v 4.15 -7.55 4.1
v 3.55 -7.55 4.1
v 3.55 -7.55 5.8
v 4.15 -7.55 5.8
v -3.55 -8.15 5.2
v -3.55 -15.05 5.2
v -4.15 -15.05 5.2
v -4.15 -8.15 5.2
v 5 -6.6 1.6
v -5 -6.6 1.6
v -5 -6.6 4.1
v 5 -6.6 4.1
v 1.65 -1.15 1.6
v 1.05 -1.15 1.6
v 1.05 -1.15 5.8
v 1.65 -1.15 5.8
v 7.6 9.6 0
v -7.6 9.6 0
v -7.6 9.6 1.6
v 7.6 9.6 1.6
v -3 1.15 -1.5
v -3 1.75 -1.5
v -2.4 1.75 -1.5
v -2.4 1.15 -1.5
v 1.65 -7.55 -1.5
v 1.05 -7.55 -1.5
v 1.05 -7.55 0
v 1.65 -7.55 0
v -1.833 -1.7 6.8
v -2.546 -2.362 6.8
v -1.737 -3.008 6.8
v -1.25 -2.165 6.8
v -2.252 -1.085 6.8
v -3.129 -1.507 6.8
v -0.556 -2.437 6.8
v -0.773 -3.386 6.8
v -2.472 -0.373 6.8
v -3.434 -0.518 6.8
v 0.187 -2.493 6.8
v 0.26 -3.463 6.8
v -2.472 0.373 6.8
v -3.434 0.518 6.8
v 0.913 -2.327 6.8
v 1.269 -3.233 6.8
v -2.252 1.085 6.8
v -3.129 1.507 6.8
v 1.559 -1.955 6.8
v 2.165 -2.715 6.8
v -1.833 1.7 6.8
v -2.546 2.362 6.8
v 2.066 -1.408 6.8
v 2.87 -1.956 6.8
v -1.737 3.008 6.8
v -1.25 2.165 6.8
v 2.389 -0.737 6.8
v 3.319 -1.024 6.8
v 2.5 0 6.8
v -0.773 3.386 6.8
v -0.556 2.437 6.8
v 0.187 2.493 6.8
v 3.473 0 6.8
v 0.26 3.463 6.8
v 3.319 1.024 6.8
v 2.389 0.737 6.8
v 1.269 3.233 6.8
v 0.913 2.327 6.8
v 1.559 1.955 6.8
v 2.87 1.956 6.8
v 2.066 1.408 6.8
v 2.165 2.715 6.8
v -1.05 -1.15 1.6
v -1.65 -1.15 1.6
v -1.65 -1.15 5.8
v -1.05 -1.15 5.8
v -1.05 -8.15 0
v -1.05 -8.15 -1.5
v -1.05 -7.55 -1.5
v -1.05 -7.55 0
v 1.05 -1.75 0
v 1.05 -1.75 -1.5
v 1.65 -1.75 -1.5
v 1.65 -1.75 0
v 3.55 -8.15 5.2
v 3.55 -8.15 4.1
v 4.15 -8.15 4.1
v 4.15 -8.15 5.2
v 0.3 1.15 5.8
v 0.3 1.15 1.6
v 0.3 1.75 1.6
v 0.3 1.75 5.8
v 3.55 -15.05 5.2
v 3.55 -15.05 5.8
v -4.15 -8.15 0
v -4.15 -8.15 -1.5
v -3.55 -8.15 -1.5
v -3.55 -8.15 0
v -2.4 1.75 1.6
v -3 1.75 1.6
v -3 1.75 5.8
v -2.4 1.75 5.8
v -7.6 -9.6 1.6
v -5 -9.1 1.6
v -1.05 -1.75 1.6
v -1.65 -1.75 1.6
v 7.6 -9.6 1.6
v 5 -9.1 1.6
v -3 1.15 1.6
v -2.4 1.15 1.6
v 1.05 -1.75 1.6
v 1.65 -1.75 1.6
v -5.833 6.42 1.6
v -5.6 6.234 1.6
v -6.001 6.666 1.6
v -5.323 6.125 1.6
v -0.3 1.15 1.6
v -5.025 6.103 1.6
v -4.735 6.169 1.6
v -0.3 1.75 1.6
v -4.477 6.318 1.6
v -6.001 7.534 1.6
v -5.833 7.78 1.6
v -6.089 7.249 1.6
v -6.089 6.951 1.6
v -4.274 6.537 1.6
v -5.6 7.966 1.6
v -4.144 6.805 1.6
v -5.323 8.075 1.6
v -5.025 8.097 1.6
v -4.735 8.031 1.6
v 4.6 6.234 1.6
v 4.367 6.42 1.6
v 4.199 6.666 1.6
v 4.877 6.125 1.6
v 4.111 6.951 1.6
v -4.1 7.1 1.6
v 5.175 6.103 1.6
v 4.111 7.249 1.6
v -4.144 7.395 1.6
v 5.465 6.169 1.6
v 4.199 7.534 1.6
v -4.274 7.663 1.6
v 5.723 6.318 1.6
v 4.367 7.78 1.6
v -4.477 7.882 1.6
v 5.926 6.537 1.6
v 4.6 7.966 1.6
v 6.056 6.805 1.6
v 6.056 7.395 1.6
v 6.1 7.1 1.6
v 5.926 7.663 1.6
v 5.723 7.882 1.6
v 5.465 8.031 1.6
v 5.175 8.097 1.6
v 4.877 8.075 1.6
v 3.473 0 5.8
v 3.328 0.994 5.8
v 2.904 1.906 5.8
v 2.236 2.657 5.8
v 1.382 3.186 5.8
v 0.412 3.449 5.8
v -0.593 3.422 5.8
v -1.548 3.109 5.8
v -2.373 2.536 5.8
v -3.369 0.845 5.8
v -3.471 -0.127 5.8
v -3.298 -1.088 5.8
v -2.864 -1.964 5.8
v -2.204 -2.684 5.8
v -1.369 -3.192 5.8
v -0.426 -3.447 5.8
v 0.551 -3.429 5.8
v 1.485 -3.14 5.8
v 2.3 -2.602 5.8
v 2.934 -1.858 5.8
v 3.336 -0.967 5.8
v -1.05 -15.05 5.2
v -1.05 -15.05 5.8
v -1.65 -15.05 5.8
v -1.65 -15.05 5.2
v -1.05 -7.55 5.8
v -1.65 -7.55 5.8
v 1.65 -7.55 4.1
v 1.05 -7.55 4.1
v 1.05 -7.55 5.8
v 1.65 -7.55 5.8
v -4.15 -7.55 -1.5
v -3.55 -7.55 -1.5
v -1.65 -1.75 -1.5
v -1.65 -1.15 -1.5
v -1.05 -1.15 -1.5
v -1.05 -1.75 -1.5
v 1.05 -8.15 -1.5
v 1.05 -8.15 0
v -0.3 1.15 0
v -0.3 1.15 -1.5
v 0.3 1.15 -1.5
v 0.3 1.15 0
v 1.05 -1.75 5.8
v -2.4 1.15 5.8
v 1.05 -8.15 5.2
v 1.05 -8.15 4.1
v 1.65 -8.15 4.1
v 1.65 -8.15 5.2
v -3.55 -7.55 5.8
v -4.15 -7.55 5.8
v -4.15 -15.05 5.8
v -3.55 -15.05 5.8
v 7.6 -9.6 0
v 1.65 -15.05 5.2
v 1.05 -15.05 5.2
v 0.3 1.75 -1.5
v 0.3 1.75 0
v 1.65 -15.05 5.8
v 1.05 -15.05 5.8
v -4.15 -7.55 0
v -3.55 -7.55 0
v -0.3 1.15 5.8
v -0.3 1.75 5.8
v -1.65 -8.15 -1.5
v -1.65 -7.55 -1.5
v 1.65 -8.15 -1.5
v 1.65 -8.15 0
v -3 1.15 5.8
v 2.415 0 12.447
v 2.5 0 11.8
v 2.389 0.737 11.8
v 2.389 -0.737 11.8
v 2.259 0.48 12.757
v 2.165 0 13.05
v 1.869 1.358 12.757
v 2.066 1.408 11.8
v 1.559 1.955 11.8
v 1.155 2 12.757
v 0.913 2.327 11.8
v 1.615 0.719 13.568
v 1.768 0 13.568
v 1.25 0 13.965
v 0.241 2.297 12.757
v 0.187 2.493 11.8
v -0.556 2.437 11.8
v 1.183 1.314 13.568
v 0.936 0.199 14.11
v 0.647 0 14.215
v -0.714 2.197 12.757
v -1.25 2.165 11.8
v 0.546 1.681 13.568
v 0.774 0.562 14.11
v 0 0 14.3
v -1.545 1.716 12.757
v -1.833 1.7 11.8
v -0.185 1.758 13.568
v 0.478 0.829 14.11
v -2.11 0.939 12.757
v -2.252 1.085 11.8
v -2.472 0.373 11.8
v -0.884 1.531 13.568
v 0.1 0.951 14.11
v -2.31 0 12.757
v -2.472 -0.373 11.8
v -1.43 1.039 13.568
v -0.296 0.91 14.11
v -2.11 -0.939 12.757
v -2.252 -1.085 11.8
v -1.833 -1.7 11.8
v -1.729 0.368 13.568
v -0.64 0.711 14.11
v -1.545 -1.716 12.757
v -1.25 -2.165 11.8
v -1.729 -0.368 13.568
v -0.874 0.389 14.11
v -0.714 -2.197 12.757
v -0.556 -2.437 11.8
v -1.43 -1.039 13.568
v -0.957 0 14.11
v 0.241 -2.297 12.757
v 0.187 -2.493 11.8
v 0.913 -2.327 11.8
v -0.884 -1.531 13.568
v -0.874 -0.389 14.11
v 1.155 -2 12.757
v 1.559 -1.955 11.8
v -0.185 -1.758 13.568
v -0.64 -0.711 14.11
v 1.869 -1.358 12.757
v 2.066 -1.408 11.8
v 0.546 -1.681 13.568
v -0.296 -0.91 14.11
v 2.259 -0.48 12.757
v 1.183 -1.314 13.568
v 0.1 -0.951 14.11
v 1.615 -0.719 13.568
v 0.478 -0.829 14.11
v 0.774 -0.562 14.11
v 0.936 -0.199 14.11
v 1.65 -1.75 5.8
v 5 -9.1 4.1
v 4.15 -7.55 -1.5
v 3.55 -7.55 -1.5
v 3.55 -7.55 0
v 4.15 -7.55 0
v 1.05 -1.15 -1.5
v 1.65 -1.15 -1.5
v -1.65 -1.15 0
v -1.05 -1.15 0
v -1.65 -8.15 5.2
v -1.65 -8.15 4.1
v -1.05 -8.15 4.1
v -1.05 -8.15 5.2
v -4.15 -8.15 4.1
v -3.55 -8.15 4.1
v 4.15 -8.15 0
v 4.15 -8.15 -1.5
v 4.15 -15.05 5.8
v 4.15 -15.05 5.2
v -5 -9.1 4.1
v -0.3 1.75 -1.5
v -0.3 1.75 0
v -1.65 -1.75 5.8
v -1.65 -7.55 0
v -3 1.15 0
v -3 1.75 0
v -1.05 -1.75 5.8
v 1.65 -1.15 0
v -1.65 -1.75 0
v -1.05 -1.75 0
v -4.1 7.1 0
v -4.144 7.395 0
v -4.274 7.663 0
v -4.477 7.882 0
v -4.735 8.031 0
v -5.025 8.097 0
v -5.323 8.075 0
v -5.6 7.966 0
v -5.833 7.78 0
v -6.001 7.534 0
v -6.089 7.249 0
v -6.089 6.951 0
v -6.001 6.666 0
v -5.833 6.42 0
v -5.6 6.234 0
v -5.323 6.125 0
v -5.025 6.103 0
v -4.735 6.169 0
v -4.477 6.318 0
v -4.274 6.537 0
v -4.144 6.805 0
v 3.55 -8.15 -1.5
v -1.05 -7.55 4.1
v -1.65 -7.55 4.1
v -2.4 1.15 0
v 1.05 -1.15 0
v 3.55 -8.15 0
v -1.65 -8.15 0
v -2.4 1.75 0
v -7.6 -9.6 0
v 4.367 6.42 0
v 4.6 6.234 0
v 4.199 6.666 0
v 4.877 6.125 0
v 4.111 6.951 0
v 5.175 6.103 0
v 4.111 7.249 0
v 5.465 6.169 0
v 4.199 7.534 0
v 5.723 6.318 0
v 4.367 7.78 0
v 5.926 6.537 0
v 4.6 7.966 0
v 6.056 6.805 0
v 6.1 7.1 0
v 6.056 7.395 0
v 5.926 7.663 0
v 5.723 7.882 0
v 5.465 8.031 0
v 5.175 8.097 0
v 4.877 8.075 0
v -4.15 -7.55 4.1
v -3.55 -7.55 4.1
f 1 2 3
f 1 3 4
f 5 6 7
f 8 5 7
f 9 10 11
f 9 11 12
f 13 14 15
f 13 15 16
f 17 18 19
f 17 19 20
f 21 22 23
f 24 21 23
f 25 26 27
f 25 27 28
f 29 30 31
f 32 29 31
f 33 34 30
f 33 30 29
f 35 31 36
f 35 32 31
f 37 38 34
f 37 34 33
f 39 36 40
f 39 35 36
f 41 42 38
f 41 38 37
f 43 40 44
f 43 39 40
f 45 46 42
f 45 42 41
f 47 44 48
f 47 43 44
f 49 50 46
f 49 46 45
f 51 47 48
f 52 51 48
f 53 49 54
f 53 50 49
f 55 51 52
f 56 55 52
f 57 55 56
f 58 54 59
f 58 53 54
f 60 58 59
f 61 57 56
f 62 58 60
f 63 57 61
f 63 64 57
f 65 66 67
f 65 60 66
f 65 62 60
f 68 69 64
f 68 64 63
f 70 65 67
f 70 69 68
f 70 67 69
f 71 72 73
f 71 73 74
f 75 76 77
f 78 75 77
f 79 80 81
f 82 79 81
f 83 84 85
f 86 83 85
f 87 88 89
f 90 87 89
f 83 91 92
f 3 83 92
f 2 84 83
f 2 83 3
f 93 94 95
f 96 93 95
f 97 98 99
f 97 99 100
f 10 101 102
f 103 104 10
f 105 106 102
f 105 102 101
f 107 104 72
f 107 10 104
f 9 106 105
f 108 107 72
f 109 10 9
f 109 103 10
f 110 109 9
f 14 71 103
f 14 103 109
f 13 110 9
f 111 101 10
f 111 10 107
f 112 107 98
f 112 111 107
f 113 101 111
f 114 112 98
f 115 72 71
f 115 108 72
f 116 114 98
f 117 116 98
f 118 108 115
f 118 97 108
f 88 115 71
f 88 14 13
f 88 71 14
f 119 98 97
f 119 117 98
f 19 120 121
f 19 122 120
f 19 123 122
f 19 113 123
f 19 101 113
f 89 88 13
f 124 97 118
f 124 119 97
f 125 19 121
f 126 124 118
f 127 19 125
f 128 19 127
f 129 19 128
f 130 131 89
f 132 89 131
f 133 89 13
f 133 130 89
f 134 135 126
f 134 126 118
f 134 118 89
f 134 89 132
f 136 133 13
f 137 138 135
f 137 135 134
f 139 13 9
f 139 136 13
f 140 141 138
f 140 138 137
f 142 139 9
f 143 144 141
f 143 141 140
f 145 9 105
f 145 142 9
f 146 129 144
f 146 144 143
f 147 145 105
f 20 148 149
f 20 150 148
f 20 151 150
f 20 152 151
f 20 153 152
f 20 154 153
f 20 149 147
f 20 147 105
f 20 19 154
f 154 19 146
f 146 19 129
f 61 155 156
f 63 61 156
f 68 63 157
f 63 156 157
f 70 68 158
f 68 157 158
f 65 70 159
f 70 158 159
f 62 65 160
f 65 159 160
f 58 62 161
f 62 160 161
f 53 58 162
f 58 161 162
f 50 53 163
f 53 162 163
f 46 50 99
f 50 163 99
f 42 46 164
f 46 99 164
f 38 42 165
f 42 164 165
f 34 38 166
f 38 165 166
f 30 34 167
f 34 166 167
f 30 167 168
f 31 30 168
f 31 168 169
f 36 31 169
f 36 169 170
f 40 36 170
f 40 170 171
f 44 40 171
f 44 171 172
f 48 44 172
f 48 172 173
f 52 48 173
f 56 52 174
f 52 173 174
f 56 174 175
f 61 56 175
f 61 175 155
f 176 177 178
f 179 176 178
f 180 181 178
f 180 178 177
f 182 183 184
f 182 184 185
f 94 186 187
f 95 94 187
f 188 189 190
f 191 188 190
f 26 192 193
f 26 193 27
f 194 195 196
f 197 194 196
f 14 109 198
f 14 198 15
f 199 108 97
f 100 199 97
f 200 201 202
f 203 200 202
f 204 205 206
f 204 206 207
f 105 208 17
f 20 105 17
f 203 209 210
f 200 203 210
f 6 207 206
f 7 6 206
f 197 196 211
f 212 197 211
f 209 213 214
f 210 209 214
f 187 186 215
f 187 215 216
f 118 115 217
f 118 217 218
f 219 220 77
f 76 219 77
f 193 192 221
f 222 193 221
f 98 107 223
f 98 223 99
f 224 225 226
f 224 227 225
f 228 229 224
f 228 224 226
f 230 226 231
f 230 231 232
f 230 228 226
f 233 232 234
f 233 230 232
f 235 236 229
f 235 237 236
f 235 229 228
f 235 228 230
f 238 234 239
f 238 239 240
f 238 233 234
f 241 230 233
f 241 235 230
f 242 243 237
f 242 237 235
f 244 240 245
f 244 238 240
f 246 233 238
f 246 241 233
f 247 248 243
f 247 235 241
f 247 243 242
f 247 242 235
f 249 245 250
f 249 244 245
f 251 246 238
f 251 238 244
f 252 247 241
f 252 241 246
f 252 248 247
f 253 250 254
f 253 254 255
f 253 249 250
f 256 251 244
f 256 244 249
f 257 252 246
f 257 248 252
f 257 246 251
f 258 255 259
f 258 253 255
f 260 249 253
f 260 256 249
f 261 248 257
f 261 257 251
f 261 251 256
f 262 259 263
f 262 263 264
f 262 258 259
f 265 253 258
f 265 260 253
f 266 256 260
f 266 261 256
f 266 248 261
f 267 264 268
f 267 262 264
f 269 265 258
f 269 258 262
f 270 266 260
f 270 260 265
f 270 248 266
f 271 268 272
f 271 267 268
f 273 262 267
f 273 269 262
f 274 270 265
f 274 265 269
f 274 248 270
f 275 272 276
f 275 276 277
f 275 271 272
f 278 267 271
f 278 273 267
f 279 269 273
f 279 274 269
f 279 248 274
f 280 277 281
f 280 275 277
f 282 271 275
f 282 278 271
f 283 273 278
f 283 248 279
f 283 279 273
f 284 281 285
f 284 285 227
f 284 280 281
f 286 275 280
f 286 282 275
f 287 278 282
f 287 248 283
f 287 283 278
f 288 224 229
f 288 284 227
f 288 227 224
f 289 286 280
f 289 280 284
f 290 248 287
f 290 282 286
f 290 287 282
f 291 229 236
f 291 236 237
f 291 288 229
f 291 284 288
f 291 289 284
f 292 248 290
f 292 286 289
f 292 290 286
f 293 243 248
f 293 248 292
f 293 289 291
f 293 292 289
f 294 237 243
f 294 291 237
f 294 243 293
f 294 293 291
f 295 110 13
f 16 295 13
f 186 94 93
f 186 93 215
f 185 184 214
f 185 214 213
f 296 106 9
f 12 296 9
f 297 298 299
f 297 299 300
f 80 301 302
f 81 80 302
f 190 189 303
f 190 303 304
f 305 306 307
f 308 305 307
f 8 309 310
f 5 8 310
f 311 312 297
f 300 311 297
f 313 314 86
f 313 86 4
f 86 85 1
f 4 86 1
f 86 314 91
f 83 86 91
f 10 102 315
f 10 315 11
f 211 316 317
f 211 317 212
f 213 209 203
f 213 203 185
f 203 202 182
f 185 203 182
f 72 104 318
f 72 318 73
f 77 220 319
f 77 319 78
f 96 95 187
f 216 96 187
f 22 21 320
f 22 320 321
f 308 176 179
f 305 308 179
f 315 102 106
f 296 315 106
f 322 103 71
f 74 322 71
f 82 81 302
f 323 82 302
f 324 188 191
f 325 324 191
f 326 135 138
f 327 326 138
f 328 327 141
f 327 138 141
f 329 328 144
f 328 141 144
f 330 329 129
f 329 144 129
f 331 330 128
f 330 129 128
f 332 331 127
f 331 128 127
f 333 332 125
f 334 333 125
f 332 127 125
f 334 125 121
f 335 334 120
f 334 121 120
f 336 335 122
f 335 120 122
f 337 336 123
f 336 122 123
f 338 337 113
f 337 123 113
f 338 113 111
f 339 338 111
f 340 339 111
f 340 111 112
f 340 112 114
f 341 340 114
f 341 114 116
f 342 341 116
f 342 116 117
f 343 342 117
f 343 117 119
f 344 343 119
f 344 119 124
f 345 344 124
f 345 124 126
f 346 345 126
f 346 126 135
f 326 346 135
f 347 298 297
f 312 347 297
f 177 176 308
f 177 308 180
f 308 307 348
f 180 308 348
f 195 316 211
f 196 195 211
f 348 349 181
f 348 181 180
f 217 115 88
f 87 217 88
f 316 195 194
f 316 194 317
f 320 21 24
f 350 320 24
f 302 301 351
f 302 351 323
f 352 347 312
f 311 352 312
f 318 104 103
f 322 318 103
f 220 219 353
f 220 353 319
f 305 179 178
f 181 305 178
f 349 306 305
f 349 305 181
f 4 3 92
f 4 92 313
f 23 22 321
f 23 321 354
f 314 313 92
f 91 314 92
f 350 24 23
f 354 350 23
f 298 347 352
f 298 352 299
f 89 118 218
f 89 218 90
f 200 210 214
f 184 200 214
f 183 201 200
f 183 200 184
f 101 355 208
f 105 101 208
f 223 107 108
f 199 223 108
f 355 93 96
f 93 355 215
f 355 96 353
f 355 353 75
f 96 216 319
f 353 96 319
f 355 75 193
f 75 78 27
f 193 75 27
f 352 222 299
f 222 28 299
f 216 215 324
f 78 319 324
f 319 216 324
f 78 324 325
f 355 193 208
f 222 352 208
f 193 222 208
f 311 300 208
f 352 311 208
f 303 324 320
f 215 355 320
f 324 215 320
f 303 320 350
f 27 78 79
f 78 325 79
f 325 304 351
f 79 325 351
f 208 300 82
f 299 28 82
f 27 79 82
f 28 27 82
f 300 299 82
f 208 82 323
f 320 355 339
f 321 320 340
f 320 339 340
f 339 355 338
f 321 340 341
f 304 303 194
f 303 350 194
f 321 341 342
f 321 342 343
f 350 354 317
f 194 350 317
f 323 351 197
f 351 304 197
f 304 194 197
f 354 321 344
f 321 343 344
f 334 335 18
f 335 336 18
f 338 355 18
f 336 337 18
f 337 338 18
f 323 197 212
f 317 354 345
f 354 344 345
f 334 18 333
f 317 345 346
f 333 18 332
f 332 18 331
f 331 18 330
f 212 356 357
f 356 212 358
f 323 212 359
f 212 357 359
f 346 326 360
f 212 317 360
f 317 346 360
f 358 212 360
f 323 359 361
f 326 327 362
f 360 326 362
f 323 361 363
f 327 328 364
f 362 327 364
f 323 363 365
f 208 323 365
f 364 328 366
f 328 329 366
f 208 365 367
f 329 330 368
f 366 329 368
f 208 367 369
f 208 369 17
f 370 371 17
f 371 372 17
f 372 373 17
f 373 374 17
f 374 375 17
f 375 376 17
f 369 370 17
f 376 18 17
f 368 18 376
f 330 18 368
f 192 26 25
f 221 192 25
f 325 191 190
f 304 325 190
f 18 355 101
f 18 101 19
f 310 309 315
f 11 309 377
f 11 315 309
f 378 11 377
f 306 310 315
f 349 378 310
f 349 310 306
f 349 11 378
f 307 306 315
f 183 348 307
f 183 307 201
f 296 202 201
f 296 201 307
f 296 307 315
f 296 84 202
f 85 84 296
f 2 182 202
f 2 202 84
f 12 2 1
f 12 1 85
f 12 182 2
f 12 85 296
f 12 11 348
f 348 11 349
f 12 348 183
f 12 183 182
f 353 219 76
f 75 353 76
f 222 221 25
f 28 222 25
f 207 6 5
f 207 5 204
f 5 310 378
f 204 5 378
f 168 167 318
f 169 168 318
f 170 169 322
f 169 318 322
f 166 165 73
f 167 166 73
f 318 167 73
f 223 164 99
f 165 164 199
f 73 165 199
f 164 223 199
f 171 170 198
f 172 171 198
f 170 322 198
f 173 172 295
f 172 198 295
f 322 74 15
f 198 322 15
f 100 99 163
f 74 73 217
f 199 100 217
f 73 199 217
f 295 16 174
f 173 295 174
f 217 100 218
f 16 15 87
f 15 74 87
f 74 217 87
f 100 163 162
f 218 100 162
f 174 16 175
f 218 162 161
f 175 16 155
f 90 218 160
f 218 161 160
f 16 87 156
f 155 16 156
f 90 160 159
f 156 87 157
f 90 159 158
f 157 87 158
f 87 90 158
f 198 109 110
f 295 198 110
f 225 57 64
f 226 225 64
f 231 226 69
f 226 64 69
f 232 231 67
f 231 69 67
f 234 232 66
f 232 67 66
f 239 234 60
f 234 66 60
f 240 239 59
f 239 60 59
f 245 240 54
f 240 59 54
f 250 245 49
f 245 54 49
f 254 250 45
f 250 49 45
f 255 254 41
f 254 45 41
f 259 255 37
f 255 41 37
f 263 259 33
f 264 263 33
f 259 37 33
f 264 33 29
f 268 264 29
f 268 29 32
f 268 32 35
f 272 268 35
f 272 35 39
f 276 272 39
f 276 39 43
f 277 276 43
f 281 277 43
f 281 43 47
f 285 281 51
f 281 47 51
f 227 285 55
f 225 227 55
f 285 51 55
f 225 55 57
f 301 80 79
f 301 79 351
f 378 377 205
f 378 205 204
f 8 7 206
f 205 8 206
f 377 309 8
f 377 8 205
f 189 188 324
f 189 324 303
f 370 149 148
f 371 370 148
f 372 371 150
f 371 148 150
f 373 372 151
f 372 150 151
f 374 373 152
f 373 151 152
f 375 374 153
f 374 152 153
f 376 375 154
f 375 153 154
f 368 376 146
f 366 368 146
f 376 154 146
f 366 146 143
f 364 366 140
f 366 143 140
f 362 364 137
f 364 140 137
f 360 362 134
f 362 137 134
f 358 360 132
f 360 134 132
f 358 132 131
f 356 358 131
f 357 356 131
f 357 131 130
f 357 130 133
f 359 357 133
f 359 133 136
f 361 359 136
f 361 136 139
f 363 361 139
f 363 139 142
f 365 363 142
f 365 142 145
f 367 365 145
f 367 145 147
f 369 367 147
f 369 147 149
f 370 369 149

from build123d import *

# Parameters (mm, degrees)
F0_W      = 15.2
F0_H      = 19.2
F1_DEPTH  = 1.6
F2_R      = 1
F3_DEPTH  = 25
F4_W      = 10
F4_H      = 2.5
F5_DEPTH  = 2.5
F7_W      = 0.6
F7_H      = 0.6
F8_DEPTH  = 7.3
F9_W      = 0.6
F9_H      = 0.6
F10_DEPTH = 7.5
F11_R     = 3.473111
F12_DEPTH = 1
F13_R     = 2.5
F14_DEPTH = 7.5
F15_R     = 2.5


with BuildPart() as f1:
    # F0 (on Top) → F1 (new body)
    with BuildSketch(Plane.XY):
        Rectangle(F0_W, F0_H)
    extrude(amount=F1_DEPTH)

    # F2 (on face) → F3 (cut)
    with BuildSketch(Plane.XY.offset(1.6)):
        with Locations((-5.1, 7.1)):
            Circle(F2_R)
        with Locations((5.1, 7.1)):
            Circle(F2_R)
    extrude(amount=-F3_DEPTH, mode=Mode.SUBTRACT)

    # F4 (on face) → F5 (join)
    with BuildSketch(Plane.XY.offset(1.6)):
        with Locations((0, -7.85)):
            Rectangle(F4_W, F4_H)
    extrude(amount=F5_DEPTH)

    # F7 (on offset) → F8 (join)
    with BuildSketch(Plane.XY.offset(-1.5)):
        with Locations((3.85, -7.85)):
            Rectangle(F7_W, F7_H)
        with Locations((-3.85, -7.85)):
            Rectangle(F7_W, F7_H)
        with Locations((-1.35, -7.85)):
            Rectangle(F7_W, F7_H)
        with Locations((1.35, -7.85)):
            Rectangle(F7_W, F7_H)
        with Locations((1.35, -1.45)):
            Rectangle(F7_W, F7_H)
        with Locations((-1.35, -1.45)):
            Rectangle(F7_W, F7_H)
        with Locations((0, 1.45)):
            Rectangle(F7_W, F7_H)
        with Locations((-2.7, 1.45)):
            Rectangle(F7_W, F7_H)
    extrude(amount=F8_DEPTH)

    # F9 (on face) → F10 (join)
    with BuildSketch(Plane(origin=(0, -7.55, 0), x_dir=(-1, 0, 0), z_dir=(0, 1, 0))):
        with Locations((3.85, 5.5)):
            Rectangle(F9_W, F9_H)
        with Locations((-3.85, 5.5)):
            Rectangle(F9_W, F9_H)
        with Locations((1.35, 5.5)):
            Rectangle(F9_W, F9_H)
        with Locations((-1.35, 5.5)):
            Rectangle(F9_W, F9_H)
    extrude(amount=-F10_DEPTH)

    # F11 (on face) → F12 (join)
    with BuildSketch(Plane.XY.offset(5.8)):
        Circle(F11_R)
    extrude(amount=F12_DEPTH)

    # F13 (on face) → F14 (join)
    with BuildSketch(Plane.XY.offset(6.8)):
        Circle(F13_R)
    extrude(amount=F14_DEPTH)

    # F15
    f15_edges = [f1.edges().sort_by_distance(p)[0] for p in [
        (-2.5, 0, 14.3),
    ]]
    fillet(f15_edges, radius=F15_R)


solid = f1.part
